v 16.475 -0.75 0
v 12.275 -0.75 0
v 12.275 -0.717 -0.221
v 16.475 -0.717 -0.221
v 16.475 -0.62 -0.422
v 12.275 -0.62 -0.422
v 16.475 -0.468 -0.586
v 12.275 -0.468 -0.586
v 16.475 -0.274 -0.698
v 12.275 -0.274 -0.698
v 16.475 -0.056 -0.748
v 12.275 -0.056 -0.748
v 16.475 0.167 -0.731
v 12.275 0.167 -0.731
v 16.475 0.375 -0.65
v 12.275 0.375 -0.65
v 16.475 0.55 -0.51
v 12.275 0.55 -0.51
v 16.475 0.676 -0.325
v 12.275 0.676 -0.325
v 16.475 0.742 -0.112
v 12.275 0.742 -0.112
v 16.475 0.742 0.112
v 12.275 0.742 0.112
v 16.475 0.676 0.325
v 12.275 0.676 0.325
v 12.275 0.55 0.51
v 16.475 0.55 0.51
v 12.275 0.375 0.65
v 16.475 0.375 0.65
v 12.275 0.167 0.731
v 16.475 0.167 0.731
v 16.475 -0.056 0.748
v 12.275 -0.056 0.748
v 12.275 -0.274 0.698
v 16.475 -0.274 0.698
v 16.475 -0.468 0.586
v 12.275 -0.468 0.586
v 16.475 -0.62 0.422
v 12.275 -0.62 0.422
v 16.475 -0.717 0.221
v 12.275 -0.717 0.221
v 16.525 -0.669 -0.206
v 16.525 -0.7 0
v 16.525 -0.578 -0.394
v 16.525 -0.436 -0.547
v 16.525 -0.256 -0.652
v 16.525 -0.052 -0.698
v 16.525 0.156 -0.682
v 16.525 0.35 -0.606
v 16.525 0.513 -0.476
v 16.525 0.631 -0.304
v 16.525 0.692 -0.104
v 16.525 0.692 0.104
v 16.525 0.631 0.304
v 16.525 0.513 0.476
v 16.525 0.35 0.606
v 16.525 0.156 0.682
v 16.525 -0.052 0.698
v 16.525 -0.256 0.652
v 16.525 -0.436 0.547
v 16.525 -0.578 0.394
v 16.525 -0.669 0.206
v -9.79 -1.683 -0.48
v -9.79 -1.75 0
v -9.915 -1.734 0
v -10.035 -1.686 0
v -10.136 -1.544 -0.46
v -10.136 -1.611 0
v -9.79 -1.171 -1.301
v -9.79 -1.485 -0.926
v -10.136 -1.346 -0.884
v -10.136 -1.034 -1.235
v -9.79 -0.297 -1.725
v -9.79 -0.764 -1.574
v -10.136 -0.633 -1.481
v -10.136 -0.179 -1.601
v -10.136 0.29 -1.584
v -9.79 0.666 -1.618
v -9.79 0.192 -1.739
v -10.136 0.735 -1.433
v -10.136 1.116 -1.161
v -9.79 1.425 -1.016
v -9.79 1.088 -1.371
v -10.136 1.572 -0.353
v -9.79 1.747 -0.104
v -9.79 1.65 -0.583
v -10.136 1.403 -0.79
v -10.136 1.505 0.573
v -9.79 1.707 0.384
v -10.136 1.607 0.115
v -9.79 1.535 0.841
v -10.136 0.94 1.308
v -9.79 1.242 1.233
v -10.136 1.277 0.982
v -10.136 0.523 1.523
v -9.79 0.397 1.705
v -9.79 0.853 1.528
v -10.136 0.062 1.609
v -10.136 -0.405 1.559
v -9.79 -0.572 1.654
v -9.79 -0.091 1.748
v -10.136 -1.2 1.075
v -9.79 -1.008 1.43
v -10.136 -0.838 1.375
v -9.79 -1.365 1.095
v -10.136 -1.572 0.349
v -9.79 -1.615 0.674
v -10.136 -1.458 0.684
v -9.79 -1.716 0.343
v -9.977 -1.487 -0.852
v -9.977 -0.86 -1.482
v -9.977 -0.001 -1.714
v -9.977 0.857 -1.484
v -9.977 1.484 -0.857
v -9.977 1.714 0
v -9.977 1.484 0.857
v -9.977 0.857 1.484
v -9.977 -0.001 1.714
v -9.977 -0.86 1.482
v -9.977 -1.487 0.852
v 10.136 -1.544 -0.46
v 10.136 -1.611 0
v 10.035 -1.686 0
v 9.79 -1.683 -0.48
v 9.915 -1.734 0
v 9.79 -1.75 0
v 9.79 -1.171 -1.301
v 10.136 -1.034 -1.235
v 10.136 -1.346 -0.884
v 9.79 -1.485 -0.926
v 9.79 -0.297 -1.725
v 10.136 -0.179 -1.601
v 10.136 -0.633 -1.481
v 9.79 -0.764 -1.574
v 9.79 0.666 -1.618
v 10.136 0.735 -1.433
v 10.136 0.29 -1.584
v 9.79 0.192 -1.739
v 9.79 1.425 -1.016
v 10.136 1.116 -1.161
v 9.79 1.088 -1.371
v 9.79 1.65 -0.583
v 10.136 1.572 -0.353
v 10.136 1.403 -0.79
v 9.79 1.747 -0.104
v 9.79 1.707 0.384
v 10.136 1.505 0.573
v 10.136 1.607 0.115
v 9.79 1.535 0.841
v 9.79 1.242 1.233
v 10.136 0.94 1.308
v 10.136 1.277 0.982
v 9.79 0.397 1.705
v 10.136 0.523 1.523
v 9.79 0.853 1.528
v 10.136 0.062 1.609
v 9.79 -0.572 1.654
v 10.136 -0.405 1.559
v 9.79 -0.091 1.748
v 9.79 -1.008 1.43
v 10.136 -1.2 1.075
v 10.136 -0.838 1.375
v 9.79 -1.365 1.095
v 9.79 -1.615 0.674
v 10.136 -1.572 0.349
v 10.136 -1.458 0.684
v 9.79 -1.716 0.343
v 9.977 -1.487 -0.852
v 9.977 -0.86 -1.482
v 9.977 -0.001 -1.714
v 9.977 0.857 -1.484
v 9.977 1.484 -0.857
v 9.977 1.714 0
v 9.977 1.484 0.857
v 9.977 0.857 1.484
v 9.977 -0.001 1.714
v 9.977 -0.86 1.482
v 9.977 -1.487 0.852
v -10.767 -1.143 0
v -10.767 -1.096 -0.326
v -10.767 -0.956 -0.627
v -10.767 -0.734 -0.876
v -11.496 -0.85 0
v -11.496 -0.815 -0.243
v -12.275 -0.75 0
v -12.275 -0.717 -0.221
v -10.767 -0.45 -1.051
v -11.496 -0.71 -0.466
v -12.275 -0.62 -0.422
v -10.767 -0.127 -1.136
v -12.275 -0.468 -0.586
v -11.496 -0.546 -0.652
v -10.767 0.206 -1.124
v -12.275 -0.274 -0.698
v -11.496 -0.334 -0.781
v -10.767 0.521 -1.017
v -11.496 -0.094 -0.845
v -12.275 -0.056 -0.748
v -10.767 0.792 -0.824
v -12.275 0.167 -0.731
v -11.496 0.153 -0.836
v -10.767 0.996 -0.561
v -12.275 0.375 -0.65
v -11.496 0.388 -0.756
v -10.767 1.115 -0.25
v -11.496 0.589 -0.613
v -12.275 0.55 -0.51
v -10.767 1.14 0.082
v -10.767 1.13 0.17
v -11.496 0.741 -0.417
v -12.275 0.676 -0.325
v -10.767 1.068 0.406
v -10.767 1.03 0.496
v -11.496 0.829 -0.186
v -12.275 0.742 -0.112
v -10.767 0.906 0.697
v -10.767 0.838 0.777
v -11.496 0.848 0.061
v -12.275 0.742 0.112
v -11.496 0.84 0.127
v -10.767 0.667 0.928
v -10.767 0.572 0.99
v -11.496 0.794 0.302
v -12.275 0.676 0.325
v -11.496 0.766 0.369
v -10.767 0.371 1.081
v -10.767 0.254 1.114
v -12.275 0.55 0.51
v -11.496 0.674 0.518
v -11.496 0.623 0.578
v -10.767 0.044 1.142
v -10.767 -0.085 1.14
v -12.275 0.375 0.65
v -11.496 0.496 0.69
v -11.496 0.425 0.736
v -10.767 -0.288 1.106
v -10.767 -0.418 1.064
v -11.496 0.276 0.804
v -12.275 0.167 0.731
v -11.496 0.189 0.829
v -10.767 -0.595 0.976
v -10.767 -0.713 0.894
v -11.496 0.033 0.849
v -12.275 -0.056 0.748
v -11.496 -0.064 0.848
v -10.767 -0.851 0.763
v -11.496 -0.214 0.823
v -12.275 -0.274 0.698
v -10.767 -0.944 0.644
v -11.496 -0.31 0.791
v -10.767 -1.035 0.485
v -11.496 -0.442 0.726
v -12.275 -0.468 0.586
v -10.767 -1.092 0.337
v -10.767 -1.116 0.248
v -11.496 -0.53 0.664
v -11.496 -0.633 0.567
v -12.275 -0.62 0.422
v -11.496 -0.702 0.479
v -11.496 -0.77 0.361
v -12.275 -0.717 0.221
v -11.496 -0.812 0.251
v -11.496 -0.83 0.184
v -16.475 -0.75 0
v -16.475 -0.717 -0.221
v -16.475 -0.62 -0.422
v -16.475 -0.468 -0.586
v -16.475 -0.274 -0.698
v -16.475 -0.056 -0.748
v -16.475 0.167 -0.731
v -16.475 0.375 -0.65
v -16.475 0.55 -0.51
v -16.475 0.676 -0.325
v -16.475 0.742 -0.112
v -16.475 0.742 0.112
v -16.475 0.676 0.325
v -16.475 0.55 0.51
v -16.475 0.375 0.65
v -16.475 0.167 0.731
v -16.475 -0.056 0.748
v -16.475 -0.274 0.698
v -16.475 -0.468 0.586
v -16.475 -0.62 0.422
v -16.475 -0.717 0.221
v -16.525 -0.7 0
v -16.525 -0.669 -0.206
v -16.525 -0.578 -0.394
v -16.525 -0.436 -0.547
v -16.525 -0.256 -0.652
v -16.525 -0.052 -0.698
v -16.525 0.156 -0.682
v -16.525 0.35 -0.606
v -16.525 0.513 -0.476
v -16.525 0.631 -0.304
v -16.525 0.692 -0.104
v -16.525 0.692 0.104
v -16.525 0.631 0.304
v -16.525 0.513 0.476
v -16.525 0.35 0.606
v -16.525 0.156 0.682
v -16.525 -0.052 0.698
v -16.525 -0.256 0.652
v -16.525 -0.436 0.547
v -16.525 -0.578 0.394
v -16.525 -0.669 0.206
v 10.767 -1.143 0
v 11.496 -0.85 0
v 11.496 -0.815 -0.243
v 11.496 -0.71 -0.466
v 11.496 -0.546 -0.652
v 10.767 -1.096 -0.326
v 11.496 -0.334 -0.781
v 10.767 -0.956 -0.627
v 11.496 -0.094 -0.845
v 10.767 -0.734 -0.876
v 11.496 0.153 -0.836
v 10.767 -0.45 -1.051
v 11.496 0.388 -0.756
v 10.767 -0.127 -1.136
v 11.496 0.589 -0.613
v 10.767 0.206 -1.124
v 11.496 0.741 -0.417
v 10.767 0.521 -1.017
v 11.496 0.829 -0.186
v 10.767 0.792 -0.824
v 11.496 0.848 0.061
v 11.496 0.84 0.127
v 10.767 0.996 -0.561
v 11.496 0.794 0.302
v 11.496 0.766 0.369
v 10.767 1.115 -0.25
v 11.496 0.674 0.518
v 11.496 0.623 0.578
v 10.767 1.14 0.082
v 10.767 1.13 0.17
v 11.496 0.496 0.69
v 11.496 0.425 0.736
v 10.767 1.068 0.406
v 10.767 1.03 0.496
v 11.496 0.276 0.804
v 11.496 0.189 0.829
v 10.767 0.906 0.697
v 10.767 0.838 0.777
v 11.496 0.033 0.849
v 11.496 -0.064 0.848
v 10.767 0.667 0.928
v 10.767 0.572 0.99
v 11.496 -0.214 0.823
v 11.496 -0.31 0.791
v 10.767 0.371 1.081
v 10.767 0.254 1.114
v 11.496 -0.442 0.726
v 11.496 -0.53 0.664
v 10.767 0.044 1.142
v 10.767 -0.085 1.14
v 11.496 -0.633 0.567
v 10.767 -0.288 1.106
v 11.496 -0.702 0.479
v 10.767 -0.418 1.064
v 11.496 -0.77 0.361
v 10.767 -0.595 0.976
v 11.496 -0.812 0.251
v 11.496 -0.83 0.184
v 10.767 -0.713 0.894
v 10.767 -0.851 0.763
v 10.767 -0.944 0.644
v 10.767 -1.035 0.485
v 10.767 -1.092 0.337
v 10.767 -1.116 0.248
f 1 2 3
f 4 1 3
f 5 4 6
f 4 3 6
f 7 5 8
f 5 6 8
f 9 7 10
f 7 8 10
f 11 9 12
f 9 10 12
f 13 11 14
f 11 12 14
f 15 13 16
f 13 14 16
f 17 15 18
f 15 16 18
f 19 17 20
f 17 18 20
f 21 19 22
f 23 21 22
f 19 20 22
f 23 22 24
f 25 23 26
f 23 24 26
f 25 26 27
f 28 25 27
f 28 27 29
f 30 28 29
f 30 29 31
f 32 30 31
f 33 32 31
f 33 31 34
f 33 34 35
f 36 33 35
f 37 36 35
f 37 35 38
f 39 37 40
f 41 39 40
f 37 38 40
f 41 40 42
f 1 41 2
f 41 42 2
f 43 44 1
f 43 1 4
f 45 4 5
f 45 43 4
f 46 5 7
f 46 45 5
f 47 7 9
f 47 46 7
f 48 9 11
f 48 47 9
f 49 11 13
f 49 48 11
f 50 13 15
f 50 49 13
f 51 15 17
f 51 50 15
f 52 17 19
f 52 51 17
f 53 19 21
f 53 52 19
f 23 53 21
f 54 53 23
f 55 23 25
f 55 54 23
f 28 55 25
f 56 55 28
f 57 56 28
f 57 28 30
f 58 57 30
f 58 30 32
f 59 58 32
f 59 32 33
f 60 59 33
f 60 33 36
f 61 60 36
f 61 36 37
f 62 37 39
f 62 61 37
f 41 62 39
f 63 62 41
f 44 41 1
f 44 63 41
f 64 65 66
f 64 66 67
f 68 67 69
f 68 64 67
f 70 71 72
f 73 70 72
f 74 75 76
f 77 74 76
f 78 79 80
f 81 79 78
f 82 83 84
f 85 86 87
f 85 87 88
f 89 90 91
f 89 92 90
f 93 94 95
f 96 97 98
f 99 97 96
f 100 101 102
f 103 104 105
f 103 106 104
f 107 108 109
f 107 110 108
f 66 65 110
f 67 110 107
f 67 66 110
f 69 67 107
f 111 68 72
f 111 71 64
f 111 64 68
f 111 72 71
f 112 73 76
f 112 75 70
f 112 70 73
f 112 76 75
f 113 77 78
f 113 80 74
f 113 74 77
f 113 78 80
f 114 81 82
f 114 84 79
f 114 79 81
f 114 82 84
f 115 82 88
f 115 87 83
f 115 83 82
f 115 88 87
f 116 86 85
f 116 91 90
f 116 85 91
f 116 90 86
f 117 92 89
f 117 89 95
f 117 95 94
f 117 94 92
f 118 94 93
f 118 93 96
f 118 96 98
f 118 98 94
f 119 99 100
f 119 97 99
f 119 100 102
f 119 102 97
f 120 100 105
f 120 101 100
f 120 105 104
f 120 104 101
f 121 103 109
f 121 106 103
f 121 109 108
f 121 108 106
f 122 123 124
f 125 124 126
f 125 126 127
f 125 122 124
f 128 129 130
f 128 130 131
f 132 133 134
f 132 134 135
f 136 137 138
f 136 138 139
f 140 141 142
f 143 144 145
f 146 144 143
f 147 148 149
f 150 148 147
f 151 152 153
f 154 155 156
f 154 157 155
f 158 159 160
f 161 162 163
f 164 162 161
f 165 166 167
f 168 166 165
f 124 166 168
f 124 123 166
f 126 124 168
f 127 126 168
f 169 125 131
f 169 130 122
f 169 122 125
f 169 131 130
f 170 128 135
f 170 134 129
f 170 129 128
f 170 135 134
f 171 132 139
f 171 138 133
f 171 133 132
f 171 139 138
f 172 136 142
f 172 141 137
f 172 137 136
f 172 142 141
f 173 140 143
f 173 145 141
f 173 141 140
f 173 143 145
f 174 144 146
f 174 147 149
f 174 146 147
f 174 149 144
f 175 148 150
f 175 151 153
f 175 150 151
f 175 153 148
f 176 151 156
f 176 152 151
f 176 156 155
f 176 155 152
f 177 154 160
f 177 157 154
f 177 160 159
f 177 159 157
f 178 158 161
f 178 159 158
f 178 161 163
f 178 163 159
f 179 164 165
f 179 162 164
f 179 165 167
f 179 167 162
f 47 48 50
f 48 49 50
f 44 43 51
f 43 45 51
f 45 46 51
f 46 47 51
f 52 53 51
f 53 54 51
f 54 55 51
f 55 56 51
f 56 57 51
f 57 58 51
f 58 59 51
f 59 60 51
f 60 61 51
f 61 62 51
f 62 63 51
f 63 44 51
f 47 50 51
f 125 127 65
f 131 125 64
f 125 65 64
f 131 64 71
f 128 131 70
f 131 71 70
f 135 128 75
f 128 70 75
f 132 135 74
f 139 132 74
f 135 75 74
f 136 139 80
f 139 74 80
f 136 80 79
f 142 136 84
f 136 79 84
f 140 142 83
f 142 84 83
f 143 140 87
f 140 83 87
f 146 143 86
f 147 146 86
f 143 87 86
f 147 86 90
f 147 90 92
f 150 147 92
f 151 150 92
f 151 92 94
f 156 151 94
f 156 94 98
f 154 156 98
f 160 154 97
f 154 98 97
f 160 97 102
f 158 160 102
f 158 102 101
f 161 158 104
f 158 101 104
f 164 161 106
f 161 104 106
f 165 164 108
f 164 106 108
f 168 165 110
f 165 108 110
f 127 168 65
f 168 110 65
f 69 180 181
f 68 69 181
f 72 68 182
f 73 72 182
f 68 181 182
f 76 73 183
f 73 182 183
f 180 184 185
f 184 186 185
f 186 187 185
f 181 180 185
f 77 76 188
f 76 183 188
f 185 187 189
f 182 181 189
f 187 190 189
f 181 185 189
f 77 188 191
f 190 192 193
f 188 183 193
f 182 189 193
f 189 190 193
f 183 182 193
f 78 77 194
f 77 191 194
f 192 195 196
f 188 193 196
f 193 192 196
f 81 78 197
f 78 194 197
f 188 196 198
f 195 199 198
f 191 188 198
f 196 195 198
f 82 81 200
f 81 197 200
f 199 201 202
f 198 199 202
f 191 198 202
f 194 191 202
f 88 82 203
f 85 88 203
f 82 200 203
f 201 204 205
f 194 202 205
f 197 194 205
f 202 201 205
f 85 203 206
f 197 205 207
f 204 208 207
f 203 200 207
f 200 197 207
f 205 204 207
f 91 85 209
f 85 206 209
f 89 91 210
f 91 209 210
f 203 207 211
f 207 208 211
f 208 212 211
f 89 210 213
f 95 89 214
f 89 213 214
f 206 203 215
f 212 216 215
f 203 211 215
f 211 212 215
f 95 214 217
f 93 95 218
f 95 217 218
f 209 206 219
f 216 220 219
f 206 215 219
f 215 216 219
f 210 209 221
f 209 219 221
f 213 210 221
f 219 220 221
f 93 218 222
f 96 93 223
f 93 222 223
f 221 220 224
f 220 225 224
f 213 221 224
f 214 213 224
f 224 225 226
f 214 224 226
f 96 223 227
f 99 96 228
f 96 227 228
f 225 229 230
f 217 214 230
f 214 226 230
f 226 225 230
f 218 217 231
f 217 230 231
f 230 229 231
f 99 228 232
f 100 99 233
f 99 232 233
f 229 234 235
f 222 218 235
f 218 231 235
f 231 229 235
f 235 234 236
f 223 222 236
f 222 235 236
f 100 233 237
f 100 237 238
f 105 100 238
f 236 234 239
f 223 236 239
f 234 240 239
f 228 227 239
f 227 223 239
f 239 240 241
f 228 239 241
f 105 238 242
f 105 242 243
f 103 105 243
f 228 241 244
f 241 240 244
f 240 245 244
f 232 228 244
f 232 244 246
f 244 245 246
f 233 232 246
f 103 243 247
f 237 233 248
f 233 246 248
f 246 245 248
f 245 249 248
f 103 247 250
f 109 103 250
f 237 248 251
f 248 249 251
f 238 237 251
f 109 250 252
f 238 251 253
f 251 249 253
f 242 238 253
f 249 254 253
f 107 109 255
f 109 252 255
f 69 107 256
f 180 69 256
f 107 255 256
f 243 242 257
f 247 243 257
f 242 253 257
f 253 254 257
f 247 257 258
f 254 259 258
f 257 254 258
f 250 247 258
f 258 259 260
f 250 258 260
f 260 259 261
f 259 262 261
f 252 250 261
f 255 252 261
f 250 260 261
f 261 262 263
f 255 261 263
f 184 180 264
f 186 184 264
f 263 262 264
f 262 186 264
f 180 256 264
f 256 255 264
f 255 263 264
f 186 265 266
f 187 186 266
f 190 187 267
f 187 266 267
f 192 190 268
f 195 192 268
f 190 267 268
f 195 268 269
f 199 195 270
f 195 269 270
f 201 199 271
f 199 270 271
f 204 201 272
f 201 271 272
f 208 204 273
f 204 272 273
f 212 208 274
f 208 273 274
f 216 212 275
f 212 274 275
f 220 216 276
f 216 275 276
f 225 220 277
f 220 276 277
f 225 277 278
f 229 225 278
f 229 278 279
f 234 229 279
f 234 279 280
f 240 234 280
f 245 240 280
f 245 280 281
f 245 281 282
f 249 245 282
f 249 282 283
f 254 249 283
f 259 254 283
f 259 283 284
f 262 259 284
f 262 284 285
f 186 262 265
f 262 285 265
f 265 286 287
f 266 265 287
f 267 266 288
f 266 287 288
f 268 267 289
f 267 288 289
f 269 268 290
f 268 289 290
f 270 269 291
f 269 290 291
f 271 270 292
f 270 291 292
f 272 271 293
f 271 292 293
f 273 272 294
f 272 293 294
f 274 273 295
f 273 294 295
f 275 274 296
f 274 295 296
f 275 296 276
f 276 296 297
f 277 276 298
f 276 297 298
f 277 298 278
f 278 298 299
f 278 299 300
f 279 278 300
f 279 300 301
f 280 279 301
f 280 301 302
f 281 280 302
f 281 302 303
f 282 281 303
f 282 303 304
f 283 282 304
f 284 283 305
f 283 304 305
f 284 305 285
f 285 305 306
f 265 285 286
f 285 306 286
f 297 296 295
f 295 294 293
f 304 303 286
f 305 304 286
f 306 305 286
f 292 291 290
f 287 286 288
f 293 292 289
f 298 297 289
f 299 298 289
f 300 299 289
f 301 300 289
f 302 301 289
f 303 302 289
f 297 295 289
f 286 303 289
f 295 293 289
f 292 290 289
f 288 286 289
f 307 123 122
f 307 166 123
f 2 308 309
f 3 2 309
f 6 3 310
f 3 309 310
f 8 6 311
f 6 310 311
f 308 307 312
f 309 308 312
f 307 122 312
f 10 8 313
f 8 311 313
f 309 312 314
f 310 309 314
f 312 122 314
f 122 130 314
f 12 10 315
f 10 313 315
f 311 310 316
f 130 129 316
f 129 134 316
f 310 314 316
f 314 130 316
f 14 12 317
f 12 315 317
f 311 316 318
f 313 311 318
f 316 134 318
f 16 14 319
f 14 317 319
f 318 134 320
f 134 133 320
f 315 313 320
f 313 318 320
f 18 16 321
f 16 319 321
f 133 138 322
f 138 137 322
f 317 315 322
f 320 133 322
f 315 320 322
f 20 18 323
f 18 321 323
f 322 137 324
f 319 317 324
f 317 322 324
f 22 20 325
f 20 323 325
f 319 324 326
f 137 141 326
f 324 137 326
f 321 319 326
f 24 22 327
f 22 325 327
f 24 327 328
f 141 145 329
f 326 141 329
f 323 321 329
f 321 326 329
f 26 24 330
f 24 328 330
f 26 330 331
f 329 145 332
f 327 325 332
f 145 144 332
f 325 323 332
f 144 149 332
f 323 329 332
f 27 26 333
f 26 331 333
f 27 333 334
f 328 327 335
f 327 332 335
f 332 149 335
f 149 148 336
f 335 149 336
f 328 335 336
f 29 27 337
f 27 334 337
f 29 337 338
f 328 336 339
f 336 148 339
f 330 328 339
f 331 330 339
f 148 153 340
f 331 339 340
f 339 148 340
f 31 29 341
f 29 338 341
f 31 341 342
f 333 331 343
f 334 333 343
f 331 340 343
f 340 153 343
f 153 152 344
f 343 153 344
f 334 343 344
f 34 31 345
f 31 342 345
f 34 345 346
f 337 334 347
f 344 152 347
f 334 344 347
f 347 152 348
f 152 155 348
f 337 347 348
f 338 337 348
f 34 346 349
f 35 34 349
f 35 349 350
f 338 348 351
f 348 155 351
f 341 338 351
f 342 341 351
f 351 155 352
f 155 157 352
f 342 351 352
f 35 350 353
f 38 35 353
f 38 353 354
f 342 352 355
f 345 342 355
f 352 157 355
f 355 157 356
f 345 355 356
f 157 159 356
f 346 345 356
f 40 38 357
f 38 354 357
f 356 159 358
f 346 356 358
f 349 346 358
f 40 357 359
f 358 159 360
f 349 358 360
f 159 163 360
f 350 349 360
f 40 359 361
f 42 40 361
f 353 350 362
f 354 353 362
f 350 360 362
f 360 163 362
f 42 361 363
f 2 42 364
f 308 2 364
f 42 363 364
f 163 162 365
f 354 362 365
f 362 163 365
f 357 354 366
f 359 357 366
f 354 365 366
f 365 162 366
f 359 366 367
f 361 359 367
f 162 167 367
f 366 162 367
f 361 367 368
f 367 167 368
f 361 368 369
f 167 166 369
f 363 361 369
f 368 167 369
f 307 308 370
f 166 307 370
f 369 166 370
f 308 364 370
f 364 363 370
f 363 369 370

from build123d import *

# Parameters (mm, degrees)
FILLET1_R     = 0.5
CHAMFER1_SIZE = 0.05


with BuildPart() as part:
    # Sketch1 → Revolve1 (revolve)
    with BuildSketch(Plane.XY, mode=Mode.PRIVATE) as revolve1_sk:
        with BuildLine():
            Line((-16.525, 0), (16.525, 0))
            Line((16.525, 0), (16.525, 0.75))
            Line((16.525, 0.75), (12.275, 0.75))
            ThreePointArc((12.275, 0.75), (11.032459759, 1.011033452), (10, 1.75))
            Line((10, 1.75), (-10, 1.75))
            ThreePointArc((-10, 1.75), (-11.032459759, 1.011033452), (-12.275, 0.75))
            Line((-12.275, 0.75), (-16.525, 0.75))
            Line((-16.525, 0.75), (-16.525, 0))
        make_face()
    revolve(revolve1_sk.sketch.rotate(Axis((-16.525, 0, 0), (1, 0, 0)), 180), axis=Axis((-16.525, 0, 0), (1, 0, 0)))

    # Fillet1
    fillet1_edges = [part.edges().sort_by_distance(p)[0] for p in [
        (-10, 1.75, 0),
        (10, 1.75, 0),
    ]]
    fillet(fillet1_edges, radius=FILLET1_R)

    # Chamfer1
    chamfer1_edges = [part.edges().sort_by_distance(p)[0] for p in [
        (-16.525, 0.75, 0),
        (16.525, 0.75, 0),
    ]]
    chamfer(chamfer1_edges, length=CHAMFER1_SIZE)


solid = part.part
